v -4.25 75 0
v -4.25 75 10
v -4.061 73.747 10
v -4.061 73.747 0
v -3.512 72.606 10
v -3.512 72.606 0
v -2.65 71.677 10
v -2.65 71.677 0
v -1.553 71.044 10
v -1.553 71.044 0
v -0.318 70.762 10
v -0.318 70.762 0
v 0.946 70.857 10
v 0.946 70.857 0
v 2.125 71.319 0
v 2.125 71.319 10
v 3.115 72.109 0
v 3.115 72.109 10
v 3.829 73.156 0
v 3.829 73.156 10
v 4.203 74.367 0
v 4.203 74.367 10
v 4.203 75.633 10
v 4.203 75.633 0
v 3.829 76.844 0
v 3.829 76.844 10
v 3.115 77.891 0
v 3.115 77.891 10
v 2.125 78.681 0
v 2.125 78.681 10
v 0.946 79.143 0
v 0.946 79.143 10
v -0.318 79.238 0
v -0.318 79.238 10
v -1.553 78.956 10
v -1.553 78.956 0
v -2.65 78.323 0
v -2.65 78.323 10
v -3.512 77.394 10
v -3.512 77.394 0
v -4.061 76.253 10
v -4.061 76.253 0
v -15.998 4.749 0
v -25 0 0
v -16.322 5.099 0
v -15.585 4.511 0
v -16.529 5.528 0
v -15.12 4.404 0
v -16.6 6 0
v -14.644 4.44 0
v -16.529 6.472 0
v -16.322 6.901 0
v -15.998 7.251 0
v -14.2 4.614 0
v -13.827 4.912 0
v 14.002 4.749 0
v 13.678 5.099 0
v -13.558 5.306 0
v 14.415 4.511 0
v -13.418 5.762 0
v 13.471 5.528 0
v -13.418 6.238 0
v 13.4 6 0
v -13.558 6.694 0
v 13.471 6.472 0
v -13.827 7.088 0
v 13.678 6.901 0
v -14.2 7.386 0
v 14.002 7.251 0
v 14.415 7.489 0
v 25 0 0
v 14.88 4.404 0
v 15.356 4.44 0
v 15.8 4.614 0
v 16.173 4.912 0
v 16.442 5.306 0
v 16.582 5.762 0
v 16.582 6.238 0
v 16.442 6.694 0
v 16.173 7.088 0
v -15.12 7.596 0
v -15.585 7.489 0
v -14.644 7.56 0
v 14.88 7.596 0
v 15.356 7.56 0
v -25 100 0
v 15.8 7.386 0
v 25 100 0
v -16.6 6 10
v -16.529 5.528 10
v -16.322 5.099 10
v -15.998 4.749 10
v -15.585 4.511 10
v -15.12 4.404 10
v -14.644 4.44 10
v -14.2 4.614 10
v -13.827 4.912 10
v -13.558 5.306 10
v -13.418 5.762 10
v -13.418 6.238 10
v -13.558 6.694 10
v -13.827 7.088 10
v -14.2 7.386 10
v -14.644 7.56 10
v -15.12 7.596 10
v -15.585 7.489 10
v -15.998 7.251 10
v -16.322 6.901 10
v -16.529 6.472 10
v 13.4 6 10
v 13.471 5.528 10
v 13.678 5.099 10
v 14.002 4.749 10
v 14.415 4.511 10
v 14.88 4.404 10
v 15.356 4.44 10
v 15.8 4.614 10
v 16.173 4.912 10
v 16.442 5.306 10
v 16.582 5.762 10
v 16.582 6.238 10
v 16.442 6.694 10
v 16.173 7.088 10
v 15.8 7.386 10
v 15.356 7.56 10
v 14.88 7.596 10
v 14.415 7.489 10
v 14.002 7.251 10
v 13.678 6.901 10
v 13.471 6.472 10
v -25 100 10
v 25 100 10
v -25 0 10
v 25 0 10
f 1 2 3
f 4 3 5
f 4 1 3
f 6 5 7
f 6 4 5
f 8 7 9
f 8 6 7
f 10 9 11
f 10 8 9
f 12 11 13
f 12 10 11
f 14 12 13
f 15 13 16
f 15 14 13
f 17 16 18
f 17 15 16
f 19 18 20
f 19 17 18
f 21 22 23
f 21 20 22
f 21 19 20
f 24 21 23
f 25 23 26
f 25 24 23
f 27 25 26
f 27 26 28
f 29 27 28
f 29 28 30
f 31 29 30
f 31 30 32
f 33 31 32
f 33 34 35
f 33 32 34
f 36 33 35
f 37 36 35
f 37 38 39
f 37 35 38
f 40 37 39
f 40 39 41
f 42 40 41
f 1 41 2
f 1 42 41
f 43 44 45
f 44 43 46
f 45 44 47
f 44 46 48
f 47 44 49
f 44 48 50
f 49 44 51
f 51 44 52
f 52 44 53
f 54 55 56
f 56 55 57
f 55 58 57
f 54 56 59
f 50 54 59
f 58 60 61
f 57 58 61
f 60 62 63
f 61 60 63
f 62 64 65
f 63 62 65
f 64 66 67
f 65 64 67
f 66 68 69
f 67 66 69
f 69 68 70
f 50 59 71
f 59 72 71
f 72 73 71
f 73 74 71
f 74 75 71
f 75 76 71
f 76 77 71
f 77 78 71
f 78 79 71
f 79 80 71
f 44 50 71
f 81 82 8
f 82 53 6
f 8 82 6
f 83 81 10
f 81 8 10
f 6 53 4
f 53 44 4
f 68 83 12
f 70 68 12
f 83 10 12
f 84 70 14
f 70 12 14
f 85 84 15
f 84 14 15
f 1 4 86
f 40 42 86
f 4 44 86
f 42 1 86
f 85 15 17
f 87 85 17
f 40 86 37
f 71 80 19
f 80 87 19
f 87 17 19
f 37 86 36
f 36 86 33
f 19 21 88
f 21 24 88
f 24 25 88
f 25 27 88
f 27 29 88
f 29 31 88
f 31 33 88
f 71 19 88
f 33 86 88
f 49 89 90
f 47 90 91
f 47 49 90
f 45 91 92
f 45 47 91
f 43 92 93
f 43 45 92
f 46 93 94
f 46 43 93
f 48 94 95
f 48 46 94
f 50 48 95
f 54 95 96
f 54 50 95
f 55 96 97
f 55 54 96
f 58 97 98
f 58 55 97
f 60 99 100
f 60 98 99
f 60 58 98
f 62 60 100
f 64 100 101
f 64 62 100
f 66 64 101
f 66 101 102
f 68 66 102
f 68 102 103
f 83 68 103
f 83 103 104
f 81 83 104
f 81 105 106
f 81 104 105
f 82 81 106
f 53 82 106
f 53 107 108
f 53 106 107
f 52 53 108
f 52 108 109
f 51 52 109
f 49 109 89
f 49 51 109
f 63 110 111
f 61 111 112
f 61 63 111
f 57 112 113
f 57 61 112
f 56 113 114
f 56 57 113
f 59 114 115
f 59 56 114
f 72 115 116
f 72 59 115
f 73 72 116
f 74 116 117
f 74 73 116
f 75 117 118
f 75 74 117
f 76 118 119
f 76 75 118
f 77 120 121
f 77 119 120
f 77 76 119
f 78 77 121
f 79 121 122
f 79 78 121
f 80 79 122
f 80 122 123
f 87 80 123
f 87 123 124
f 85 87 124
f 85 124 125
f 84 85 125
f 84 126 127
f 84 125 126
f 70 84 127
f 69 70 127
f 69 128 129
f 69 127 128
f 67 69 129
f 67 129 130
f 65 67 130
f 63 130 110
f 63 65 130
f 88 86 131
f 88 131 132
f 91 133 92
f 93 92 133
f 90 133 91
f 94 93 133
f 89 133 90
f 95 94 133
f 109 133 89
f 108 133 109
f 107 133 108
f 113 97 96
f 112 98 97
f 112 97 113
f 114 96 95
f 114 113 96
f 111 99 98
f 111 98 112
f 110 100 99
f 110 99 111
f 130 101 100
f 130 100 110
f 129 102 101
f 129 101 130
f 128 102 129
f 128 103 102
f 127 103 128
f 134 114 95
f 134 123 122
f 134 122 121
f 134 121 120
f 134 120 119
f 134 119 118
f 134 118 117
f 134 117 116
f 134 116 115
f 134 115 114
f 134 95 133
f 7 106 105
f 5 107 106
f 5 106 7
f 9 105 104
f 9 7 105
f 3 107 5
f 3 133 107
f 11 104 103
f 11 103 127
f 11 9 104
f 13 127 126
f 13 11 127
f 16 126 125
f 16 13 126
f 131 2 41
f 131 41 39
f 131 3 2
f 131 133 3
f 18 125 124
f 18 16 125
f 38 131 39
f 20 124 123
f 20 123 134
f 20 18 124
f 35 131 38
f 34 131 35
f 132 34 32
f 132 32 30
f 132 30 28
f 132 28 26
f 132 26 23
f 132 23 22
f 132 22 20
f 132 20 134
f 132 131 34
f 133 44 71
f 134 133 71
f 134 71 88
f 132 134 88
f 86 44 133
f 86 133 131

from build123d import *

# Parameters (mm, degrees)
SKETCH1_W           = 50
SKETCH1_H           = 100
BOSS_EXTRUDE1_DEPTH = 10
SKETCH2_R           = 4.25
SKETCH2_R_2         = 1.6
CUT_EXTRUDE2_DEPTH  = 11


with BuildPart() as part:
    # Sketch1 → Boss-Extrude1 (new body)
    with BuildSketch(Plane.XY):
        with Locations((0, 50)):
            Rectangle(SKETCH1_W, SKETCH1_H)
    extrude(amount=BOSS_EXTRUDE1_DEPTH)

    # Sketch2 → Cut-Extrude2 (cut)
    with BuildSketch(Plane.XY):
        with Locations(Location((0, 75, 0), (0, 0, 180))):
            Circle(SKETCH2_R)
        with Locations(Location((15, 6, 0), (0, 0, 180))):
            Circle(SKETCH2_R_2)
        with Locations(Location((-15, 6, 0), (0, 0, 180))):
            Circle(SKETCH2_R_2)
    extrude(amount=CUT_EXTRUDE2_DEPTH, mode=Mode.SUBTRACT)


solid = part.part
